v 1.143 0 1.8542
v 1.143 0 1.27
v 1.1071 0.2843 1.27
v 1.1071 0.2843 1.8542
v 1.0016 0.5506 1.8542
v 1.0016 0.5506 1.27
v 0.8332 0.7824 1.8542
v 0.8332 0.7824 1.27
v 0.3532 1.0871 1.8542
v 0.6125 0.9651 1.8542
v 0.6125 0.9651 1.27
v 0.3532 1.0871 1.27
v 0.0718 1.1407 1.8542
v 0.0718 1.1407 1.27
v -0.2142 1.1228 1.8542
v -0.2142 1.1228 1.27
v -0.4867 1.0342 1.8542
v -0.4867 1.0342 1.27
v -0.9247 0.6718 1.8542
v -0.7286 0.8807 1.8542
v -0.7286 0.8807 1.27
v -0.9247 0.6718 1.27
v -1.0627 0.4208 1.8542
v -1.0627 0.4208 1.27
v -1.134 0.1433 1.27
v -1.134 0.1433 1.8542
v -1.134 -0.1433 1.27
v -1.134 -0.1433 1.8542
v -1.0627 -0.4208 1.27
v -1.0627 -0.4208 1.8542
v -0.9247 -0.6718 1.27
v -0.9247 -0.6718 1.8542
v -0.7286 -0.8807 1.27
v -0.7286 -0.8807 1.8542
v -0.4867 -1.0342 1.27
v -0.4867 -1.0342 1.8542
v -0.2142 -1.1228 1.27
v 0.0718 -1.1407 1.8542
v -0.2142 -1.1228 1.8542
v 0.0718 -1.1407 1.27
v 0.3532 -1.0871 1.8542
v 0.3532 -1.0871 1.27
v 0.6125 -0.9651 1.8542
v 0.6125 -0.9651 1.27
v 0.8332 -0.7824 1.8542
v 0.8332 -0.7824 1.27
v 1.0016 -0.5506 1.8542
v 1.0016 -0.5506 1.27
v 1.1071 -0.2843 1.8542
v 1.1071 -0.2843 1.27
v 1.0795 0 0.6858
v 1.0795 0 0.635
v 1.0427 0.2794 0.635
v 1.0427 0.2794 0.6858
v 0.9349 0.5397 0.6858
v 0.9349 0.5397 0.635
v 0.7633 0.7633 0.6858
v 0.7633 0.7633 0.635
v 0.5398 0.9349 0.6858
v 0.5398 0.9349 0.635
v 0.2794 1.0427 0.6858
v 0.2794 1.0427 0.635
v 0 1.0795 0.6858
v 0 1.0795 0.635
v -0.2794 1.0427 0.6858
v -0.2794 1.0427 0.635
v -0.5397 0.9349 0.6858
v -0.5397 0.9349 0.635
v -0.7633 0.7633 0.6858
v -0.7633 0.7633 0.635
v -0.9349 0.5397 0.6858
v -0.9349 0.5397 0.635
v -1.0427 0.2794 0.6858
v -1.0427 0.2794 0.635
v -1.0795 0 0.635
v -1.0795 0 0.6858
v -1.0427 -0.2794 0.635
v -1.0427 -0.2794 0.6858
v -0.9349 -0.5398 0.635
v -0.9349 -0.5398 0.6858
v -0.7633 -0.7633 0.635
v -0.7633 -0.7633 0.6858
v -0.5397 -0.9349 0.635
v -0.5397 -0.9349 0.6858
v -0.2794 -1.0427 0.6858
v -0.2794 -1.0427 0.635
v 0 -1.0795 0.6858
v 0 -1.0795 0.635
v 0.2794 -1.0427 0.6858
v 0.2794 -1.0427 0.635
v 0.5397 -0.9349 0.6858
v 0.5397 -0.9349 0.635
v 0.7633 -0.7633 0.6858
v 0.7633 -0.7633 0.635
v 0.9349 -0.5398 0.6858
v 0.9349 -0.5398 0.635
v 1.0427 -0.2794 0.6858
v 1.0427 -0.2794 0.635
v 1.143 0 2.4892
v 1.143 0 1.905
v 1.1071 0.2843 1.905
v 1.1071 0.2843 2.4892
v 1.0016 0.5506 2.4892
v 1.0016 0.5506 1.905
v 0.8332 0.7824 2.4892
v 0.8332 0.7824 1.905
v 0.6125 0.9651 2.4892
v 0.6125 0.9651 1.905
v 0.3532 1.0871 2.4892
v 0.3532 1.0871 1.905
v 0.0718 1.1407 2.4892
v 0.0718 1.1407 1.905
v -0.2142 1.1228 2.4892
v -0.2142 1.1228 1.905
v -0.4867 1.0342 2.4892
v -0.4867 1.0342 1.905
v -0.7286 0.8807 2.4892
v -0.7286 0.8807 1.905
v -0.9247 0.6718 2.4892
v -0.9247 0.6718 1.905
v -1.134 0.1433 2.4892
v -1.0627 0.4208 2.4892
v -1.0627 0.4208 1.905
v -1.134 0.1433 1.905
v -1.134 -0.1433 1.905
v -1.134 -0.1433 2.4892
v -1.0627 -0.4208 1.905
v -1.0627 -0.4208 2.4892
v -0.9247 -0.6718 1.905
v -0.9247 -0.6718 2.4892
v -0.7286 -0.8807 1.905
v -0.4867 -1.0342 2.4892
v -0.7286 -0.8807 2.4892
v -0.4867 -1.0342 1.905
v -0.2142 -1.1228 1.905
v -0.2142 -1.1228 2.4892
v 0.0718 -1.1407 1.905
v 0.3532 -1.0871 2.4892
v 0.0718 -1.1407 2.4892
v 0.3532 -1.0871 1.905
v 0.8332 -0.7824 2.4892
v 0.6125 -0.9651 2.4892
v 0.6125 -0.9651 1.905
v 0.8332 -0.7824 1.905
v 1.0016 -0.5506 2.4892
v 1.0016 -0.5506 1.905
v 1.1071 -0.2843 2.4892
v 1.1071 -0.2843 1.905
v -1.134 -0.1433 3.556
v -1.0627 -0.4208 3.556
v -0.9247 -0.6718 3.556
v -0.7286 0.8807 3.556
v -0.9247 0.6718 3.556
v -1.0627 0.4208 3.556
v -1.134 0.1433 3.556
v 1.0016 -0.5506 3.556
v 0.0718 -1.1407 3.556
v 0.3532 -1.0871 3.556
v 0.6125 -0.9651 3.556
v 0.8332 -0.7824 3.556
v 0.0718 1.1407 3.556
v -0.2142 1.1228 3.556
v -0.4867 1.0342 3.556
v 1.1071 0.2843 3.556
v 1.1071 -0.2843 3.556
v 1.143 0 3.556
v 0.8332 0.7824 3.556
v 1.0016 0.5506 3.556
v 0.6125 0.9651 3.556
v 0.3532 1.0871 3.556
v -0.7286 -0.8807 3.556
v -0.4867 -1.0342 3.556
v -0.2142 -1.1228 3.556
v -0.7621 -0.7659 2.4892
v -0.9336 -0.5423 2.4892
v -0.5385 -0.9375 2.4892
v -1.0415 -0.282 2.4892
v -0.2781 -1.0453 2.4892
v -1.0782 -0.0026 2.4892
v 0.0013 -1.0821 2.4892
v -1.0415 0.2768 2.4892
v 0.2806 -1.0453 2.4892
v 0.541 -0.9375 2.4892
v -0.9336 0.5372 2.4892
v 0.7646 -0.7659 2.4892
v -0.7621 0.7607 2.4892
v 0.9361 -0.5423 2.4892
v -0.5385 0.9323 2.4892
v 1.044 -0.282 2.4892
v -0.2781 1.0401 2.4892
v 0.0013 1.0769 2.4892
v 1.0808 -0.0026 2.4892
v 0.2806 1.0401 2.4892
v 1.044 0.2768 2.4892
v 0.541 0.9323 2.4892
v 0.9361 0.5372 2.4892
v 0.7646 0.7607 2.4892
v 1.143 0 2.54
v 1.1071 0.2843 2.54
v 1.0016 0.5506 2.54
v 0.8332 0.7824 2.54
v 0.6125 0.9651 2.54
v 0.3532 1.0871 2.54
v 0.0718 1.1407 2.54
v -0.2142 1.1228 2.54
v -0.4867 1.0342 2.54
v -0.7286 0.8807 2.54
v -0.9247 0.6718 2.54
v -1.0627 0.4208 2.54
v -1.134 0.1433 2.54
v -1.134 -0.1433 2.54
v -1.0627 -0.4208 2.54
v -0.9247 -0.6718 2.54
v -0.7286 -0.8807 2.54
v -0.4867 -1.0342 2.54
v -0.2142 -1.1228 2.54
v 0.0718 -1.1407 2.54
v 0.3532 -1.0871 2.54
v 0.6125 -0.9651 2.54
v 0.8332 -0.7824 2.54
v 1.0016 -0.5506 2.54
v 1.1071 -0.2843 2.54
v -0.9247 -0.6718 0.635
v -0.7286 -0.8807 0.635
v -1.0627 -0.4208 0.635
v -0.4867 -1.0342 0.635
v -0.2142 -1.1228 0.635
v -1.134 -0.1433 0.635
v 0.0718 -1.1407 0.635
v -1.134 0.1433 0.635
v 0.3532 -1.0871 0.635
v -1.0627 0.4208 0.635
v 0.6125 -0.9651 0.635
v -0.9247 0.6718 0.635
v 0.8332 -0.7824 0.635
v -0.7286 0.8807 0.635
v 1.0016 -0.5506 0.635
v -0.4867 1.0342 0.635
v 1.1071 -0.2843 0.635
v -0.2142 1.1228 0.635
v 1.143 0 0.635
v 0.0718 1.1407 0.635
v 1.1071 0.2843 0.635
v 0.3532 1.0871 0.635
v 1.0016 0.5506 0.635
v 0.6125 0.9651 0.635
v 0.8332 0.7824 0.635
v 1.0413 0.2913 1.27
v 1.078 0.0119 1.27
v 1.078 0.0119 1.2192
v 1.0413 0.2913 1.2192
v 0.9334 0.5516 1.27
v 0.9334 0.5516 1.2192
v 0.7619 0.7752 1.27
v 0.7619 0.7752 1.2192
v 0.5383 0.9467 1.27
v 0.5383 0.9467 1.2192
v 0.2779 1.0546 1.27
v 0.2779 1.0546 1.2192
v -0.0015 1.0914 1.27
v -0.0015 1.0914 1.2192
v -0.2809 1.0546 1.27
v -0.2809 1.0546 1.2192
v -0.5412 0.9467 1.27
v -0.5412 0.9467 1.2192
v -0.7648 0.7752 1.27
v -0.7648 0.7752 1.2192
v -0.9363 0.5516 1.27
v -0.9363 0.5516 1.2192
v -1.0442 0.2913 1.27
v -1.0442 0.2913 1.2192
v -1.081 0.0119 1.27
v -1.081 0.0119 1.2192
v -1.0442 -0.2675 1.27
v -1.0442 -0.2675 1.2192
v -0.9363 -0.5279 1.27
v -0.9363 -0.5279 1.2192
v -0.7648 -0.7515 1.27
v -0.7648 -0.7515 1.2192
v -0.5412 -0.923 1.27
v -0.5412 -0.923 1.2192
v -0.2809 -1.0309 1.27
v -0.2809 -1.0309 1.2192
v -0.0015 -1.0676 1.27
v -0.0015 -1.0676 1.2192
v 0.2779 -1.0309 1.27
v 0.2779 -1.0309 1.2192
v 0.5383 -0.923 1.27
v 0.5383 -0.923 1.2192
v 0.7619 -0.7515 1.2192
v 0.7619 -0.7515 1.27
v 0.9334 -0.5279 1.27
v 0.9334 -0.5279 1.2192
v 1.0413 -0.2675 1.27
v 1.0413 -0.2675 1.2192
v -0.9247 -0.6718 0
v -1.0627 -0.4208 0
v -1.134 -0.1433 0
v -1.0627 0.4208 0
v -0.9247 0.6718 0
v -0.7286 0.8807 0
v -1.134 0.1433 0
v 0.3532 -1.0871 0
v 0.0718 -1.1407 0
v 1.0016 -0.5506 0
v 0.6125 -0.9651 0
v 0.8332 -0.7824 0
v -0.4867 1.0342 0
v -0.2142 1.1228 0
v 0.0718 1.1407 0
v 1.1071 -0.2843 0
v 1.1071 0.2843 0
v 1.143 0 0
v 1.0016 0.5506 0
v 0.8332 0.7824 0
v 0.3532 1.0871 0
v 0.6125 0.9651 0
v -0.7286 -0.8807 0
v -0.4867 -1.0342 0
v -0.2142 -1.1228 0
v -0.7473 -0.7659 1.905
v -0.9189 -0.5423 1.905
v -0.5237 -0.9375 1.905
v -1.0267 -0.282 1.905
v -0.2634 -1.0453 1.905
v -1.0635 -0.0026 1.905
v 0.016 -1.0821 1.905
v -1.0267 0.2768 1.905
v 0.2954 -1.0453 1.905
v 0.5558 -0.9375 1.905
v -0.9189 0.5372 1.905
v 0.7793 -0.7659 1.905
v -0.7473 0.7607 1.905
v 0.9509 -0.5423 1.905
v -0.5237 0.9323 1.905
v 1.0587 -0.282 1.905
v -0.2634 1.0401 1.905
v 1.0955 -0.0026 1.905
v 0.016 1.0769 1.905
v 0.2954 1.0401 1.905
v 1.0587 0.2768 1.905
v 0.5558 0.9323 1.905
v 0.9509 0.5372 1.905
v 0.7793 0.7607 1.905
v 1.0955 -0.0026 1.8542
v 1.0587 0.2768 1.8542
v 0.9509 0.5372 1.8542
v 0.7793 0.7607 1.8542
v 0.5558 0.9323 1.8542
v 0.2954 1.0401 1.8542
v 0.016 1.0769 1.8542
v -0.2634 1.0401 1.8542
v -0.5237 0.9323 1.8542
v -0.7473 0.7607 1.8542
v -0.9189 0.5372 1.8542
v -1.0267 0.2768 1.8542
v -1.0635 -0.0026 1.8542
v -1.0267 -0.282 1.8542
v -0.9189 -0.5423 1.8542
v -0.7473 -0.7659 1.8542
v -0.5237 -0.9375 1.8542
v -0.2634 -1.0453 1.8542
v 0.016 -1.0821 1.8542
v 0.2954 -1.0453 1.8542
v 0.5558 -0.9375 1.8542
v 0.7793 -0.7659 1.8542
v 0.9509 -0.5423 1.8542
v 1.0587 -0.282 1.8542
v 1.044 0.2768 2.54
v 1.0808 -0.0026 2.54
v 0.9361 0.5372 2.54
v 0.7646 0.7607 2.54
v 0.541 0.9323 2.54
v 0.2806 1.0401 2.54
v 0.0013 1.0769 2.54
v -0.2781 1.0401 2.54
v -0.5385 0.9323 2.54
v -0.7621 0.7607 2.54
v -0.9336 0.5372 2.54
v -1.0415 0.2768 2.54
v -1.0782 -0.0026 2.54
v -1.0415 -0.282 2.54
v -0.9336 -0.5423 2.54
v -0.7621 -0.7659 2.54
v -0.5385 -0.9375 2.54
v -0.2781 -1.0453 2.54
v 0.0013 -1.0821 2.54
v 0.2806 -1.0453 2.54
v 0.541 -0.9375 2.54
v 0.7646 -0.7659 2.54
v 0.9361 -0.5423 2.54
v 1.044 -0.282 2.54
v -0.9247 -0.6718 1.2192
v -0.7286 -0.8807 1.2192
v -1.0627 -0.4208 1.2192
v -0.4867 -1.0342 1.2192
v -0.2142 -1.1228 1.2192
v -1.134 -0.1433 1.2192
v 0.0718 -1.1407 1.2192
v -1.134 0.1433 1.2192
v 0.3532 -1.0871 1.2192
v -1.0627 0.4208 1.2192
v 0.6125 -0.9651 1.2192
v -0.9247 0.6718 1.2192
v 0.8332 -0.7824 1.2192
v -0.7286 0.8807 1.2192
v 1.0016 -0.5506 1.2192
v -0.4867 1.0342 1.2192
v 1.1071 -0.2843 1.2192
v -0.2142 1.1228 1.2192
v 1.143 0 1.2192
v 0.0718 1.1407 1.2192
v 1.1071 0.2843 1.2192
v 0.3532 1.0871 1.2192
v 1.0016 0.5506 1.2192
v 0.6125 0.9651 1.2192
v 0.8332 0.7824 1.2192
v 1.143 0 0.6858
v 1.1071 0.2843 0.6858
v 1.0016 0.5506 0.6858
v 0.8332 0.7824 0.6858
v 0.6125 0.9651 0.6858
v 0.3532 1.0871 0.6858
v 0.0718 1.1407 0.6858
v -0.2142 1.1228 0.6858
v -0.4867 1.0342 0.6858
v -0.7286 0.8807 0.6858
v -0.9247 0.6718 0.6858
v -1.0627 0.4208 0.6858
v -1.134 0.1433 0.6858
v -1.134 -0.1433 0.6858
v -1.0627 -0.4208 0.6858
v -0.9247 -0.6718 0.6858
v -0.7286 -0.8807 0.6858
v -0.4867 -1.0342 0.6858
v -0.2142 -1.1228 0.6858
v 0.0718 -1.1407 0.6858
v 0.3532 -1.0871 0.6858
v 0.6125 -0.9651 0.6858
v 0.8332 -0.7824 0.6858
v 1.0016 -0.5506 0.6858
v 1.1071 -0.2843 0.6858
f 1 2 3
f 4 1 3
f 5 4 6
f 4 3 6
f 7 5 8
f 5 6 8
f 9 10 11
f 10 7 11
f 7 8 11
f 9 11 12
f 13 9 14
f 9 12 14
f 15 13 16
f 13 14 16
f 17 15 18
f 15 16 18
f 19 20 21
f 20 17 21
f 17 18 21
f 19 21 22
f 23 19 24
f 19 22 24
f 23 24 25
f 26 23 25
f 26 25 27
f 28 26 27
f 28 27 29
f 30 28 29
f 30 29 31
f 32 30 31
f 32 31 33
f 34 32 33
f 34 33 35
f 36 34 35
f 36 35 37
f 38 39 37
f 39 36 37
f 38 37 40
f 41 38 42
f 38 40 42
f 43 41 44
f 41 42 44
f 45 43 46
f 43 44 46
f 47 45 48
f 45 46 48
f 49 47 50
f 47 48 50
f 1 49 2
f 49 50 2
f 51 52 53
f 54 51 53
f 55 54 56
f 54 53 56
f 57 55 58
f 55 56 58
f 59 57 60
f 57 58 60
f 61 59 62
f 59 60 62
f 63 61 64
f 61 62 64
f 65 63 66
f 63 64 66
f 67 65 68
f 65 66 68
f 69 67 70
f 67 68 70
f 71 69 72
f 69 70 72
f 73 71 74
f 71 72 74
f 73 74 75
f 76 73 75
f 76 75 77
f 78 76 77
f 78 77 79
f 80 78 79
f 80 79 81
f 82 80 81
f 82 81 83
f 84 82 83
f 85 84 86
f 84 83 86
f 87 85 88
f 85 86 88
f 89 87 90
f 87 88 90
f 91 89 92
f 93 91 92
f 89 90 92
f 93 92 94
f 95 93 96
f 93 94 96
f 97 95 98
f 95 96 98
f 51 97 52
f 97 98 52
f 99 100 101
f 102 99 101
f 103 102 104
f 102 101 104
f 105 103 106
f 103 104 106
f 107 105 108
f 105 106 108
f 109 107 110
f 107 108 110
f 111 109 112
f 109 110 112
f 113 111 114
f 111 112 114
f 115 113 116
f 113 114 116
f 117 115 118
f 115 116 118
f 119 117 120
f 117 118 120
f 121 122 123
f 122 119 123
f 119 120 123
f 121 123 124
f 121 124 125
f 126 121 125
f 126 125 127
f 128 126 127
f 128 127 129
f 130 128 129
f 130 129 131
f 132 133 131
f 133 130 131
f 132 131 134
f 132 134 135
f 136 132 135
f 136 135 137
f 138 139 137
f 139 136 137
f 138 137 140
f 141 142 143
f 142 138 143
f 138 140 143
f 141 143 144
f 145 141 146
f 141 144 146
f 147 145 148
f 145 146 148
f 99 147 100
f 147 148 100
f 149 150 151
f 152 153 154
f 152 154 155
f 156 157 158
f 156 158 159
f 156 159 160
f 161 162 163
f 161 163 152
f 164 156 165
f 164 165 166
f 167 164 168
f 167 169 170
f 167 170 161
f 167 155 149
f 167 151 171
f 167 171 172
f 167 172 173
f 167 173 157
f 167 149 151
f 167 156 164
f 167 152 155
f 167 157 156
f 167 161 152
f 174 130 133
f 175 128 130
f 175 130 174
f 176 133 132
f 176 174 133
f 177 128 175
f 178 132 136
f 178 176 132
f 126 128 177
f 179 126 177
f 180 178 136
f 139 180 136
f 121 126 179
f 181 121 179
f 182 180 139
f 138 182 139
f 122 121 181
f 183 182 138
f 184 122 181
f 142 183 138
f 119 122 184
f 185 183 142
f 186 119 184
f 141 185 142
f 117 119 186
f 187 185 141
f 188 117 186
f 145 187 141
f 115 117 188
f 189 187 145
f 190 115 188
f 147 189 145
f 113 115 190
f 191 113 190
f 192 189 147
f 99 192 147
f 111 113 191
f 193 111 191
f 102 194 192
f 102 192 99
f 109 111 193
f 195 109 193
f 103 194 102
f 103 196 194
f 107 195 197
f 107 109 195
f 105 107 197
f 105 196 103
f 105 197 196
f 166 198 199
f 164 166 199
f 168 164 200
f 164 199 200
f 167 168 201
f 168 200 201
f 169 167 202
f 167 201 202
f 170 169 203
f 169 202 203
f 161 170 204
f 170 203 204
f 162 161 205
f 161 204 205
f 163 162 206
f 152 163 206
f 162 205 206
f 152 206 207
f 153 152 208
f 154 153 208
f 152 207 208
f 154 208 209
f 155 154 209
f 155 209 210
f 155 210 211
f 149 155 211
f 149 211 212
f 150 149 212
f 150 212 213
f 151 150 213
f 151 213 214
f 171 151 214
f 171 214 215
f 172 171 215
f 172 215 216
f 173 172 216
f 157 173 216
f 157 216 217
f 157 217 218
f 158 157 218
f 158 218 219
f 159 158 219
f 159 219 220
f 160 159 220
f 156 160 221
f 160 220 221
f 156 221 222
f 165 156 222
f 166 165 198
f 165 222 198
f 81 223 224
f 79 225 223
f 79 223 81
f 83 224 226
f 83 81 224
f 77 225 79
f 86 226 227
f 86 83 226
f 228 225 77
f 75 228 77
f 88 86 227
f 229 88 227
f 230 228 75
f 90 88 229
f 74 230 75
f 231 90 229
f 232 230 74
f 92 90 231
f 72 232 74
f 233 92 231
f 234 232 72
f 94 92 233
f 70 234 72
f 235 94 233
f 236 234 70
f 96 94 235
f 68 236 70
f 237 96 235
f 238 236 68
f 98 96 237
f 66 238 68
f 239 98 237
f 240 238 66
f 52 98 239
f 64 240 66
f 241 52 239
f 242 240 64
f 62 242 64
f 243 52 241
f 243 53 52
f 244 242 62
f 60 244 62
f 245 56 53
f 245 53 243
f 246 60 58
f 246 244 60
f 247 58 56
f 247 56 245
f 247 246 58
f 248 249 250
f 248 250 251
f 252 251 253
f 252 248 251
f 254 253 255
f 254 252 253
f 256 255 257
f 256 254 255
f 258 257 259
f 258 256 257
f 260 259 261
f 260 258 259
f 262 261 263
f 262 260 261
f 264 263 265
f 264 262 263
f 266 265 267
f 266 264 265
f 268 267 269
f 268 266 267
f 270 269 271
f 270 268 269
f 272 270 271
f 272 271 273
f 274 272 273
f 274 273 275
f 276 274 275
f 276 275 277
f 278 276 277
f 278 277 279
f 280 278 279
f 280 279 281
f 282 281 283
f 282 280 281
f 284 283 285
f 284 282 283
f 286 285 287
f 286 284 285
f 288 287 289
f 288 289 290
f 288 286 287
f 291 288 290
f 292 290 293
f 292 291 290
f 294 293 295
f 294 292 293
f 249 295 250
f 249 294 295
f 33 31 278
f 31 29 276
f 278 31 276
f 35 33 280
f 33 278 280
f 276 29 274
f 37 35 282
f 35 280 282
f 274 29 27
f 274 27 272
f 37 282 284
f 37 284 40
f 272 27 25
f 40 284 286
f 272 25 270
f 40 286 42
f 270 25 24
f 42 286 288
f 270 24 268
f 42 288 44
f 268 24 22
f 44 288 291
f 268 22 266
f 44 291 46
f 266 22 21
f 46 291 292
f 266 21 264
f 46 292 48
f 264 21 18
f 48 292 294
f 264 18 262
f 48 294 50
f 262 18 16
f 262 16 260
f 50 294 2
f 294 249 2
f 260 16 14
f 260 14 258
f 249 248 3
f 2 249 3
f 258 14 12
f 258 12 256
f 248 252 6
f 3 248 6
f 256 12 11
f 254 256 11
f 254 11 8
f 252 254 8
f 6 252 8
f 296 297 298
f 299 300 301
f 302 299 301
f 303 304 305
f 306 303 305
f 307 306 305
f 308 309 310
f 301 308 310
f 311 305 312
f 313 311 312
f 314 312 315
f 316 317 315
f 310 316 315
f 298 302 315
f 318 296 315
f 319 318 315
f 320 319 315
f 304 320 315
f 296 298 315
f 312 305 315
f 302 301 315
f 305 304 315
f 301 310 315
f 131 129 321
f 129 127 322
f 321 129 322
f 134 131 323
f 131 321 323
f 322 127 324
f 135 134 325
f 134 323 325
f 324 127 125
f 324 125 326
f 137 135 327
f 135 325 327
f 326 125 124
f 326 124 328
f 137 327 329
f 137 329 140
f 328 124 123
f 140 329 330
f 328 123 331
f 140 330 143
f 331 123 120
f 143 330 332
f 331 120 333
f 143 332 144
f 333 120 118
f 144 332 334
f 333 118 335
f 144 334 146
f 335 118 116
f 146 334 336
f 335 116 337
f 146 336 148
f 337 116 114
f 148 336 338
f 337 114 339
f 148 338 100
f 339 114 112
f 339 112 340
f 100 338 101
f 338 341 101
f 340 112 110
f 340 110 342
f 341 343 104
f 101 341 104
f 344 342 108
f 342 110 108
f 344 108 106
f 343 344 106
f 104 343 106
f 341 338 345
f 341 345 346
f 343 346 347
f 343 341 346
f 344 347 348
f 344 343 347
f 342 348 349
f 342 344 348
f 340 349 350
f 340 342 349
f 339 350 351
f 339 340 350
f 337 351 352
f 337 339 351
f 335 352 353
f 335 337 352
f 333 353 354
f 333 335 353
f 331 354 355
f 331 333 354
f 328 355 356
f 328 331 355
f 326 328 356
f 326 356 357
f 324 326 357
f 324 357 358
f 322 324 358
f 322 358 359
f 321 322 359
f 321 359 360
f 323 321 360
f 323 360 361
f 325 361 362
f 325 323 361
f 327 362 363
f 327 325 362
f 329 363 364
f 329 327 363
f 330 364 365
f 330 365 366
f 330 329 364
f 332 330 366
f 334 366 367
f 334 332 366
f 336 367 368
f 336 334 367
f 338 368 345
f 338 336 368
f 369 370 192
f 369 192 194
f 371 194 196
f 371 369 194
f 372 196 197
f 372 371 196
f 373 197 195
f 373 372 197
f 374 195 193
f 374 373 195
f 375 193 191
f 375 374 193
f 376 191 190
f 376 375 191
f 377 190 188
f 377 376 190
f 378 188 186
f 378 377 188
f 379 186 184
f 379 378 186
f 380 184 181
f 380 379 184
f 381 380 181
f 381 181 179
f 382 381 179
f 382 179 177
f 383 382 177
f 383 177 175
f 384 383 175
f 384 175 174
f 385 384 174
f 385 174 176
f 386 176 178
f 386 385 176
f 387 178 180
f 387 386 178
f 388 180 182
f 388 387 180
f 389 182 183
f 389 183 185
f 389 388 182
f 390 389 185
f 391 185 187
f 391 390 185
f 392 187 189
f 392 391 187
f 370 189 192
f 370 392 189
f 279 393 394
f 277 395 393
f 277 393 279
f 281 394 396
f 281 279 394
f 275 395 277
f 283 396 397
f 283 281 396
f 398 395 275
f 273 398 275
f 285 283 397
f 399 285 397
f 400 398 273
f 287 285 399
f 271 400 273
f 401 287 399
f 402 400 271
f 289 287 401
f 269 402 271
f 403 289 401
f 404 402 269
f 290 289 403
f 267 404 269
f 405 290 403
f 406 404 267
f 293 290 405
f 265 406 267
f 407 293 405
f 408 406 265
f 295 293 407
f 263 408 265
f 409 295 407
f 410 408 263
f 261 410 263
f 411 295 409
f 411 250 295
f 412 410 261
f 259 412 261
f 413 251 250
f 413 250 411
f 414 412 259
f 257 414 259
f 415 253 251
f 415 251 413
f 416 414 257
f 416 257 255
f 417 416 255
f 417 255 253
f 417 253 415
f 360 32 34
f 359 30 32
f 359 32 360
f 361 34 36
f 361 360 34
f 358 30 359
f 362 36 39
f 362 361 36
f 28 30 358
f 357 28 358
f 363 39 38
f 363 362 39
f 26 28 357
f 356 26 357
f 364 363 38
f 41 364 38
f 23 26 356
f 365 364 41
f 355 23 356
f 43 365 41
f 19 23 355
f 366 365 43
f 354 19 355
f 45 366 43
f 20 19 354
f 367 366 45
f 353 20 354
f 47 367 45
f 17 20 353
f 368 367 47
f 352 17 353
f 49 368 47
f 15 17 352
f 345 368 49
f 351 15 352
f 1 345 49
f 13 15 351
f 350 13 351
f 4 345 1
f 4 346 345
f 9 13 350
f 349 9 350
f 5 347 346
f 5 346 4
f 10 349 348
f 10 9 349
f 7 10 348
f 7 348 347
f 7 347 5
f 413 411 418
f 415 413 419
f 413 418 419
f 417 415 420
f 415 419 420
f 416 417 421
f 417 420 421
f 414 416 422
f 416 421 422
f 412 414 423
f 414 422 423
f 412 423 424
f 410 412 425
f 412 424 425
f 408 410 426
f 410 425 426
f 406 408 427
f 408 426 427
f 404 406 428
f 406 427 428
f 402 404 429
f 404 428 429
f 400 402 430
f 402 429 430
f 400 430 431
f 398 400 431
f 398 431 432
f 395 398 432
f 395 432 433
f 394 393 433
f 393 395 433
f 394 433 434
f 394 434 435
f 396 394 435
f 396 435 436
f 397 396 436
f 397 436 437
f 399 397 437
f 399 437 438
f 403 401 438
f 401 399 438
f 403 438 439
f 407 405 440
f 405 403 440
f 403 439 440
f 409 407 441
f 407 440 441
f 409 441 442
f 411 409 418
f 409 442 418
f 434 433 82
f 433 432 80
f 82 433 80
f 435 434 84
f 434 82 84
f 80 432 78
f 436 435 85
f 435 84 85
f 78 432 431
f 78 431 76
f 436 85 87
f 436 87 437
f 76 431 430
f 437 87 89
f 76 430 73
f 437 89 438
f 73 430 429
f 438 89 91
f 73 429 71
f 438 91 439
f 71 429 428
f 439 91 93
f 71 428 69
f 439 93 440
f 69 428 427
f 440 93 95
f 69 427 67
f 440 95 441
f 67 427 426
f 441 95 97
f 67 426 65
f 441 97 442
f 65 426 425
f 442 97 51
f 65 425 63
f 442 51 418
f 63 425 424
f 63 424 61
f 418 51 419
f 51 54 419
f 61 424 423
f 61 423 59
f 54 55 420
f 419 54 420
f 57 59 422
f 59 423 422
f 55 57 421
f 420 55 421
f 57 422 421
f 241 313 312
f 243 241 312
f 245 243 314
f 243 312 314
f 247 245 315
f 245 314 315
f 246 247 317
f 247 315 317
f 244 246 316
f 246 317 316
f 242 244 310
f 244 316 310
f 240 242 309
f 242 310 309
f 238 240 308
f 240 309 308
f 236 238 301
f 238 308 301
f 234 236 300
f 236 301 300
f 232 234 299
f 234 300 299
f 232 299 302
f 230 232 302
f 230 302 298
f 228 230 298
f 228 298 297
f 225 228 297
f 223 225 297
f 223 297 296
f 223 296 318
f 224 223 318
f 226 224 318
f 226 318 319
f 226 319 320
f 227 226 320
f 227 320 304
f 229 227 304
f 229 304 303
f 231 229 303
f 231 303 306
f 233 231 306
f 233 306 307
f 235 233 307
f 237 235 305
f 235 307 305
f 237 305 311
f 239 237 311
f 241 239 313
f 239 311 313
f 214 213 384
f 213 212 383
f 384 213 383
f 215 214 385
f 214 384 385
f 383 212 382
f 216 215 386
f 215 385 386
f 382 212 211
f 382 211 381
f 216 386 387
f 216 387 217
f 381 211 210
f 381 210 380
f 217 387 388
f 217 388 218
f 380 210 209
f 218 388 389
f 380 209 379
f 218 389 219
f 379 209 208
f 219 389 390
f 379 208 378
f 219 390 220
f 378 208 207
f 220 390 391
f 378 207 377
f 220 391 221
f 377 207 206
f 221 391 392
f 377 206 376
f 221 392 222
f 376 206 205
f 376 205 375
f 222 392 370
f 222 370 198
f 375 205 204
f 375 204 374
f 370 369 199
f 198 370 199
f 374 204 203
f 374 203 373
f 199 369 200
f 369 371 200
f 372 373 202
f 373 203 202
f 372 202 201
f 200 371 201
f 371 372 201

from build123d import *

# Parameters (mm, degrees)
F0_R      = 1.143
F1_DEPTH  = 3.556
F6_R      = 1.143
F6_R_2    = 1.0795
F7_DEPTH  = 0.0508
F8_R      = 1.1557
F8_R_2    = 1.0795
F9_DEPTH  = 0.0508
F10_R     = 1.1684
F10_R_2   = 1.0795
F11_DEPTH = 0.0508
F12_R     = 1.1557
F12_R_2   = 1.0795
F13_DEPTH = 0.0508


with BuildPart() as f1:
    # F0 (on Top) → F1 (new body)
    with BuildSketch(Plane.XY):
        Circle(F0_R)
    extrude(amount=F1_DEPTH)

    # F6 (on offset) → F7 (cut)
    with BuildSketch(Plane.XY.offset(0.635)):
        Circle(F6_R)
        Circle(F6_R_2, mode=Mode.SUBTRACT)
    extrude(amount=F7_DEPTH, mode=Mode.SUBTRACT)

    # F8 (on offset) → F9 (cut)
    with BuildSketch(Plane.XY.offset(1.27)):
        with Locations((-0.00146219, 0.0118558792)):
            Circle(F8_R)
        with Locations((-0.00146219, 0.0118558792)):
            Circle(F8_R_2, mode=Mode.SUBTRACT)
    extrude(amount=-F9_DEPTH, mode=Mode.SUBTRACT)

    # F10 (on offset) → F11 (cut)
    with BuildSketch(Plane.XY.offset(1.905)):
        with Locations((0.0160238542, -0.0025977133)):
            Circle(F10_R)
        with Locations((0.0160238542, -0.0025977133)):
            Circle(F10_R_2, mode=Mode.SUBTRACT)
    extrude(amount=-F11_DEPTH, mode=Mode.SUBTRACT)

    # F12 (on offset) → F13 (cut)
    with BuildSketch(Plane.XY.offset(2.54)):
        with Locations((0.0012521425, -0.0025977133)):
            Circle(F12_R)
        with Locations((0.0012521425, -0.0025977133)):
            Circle(F12_R_2, mode=Mode.SUBTRACT)
    extrude(amount=-F13_DEPTH, mode=Mode.SUBTRACT)


solid = f1.part
